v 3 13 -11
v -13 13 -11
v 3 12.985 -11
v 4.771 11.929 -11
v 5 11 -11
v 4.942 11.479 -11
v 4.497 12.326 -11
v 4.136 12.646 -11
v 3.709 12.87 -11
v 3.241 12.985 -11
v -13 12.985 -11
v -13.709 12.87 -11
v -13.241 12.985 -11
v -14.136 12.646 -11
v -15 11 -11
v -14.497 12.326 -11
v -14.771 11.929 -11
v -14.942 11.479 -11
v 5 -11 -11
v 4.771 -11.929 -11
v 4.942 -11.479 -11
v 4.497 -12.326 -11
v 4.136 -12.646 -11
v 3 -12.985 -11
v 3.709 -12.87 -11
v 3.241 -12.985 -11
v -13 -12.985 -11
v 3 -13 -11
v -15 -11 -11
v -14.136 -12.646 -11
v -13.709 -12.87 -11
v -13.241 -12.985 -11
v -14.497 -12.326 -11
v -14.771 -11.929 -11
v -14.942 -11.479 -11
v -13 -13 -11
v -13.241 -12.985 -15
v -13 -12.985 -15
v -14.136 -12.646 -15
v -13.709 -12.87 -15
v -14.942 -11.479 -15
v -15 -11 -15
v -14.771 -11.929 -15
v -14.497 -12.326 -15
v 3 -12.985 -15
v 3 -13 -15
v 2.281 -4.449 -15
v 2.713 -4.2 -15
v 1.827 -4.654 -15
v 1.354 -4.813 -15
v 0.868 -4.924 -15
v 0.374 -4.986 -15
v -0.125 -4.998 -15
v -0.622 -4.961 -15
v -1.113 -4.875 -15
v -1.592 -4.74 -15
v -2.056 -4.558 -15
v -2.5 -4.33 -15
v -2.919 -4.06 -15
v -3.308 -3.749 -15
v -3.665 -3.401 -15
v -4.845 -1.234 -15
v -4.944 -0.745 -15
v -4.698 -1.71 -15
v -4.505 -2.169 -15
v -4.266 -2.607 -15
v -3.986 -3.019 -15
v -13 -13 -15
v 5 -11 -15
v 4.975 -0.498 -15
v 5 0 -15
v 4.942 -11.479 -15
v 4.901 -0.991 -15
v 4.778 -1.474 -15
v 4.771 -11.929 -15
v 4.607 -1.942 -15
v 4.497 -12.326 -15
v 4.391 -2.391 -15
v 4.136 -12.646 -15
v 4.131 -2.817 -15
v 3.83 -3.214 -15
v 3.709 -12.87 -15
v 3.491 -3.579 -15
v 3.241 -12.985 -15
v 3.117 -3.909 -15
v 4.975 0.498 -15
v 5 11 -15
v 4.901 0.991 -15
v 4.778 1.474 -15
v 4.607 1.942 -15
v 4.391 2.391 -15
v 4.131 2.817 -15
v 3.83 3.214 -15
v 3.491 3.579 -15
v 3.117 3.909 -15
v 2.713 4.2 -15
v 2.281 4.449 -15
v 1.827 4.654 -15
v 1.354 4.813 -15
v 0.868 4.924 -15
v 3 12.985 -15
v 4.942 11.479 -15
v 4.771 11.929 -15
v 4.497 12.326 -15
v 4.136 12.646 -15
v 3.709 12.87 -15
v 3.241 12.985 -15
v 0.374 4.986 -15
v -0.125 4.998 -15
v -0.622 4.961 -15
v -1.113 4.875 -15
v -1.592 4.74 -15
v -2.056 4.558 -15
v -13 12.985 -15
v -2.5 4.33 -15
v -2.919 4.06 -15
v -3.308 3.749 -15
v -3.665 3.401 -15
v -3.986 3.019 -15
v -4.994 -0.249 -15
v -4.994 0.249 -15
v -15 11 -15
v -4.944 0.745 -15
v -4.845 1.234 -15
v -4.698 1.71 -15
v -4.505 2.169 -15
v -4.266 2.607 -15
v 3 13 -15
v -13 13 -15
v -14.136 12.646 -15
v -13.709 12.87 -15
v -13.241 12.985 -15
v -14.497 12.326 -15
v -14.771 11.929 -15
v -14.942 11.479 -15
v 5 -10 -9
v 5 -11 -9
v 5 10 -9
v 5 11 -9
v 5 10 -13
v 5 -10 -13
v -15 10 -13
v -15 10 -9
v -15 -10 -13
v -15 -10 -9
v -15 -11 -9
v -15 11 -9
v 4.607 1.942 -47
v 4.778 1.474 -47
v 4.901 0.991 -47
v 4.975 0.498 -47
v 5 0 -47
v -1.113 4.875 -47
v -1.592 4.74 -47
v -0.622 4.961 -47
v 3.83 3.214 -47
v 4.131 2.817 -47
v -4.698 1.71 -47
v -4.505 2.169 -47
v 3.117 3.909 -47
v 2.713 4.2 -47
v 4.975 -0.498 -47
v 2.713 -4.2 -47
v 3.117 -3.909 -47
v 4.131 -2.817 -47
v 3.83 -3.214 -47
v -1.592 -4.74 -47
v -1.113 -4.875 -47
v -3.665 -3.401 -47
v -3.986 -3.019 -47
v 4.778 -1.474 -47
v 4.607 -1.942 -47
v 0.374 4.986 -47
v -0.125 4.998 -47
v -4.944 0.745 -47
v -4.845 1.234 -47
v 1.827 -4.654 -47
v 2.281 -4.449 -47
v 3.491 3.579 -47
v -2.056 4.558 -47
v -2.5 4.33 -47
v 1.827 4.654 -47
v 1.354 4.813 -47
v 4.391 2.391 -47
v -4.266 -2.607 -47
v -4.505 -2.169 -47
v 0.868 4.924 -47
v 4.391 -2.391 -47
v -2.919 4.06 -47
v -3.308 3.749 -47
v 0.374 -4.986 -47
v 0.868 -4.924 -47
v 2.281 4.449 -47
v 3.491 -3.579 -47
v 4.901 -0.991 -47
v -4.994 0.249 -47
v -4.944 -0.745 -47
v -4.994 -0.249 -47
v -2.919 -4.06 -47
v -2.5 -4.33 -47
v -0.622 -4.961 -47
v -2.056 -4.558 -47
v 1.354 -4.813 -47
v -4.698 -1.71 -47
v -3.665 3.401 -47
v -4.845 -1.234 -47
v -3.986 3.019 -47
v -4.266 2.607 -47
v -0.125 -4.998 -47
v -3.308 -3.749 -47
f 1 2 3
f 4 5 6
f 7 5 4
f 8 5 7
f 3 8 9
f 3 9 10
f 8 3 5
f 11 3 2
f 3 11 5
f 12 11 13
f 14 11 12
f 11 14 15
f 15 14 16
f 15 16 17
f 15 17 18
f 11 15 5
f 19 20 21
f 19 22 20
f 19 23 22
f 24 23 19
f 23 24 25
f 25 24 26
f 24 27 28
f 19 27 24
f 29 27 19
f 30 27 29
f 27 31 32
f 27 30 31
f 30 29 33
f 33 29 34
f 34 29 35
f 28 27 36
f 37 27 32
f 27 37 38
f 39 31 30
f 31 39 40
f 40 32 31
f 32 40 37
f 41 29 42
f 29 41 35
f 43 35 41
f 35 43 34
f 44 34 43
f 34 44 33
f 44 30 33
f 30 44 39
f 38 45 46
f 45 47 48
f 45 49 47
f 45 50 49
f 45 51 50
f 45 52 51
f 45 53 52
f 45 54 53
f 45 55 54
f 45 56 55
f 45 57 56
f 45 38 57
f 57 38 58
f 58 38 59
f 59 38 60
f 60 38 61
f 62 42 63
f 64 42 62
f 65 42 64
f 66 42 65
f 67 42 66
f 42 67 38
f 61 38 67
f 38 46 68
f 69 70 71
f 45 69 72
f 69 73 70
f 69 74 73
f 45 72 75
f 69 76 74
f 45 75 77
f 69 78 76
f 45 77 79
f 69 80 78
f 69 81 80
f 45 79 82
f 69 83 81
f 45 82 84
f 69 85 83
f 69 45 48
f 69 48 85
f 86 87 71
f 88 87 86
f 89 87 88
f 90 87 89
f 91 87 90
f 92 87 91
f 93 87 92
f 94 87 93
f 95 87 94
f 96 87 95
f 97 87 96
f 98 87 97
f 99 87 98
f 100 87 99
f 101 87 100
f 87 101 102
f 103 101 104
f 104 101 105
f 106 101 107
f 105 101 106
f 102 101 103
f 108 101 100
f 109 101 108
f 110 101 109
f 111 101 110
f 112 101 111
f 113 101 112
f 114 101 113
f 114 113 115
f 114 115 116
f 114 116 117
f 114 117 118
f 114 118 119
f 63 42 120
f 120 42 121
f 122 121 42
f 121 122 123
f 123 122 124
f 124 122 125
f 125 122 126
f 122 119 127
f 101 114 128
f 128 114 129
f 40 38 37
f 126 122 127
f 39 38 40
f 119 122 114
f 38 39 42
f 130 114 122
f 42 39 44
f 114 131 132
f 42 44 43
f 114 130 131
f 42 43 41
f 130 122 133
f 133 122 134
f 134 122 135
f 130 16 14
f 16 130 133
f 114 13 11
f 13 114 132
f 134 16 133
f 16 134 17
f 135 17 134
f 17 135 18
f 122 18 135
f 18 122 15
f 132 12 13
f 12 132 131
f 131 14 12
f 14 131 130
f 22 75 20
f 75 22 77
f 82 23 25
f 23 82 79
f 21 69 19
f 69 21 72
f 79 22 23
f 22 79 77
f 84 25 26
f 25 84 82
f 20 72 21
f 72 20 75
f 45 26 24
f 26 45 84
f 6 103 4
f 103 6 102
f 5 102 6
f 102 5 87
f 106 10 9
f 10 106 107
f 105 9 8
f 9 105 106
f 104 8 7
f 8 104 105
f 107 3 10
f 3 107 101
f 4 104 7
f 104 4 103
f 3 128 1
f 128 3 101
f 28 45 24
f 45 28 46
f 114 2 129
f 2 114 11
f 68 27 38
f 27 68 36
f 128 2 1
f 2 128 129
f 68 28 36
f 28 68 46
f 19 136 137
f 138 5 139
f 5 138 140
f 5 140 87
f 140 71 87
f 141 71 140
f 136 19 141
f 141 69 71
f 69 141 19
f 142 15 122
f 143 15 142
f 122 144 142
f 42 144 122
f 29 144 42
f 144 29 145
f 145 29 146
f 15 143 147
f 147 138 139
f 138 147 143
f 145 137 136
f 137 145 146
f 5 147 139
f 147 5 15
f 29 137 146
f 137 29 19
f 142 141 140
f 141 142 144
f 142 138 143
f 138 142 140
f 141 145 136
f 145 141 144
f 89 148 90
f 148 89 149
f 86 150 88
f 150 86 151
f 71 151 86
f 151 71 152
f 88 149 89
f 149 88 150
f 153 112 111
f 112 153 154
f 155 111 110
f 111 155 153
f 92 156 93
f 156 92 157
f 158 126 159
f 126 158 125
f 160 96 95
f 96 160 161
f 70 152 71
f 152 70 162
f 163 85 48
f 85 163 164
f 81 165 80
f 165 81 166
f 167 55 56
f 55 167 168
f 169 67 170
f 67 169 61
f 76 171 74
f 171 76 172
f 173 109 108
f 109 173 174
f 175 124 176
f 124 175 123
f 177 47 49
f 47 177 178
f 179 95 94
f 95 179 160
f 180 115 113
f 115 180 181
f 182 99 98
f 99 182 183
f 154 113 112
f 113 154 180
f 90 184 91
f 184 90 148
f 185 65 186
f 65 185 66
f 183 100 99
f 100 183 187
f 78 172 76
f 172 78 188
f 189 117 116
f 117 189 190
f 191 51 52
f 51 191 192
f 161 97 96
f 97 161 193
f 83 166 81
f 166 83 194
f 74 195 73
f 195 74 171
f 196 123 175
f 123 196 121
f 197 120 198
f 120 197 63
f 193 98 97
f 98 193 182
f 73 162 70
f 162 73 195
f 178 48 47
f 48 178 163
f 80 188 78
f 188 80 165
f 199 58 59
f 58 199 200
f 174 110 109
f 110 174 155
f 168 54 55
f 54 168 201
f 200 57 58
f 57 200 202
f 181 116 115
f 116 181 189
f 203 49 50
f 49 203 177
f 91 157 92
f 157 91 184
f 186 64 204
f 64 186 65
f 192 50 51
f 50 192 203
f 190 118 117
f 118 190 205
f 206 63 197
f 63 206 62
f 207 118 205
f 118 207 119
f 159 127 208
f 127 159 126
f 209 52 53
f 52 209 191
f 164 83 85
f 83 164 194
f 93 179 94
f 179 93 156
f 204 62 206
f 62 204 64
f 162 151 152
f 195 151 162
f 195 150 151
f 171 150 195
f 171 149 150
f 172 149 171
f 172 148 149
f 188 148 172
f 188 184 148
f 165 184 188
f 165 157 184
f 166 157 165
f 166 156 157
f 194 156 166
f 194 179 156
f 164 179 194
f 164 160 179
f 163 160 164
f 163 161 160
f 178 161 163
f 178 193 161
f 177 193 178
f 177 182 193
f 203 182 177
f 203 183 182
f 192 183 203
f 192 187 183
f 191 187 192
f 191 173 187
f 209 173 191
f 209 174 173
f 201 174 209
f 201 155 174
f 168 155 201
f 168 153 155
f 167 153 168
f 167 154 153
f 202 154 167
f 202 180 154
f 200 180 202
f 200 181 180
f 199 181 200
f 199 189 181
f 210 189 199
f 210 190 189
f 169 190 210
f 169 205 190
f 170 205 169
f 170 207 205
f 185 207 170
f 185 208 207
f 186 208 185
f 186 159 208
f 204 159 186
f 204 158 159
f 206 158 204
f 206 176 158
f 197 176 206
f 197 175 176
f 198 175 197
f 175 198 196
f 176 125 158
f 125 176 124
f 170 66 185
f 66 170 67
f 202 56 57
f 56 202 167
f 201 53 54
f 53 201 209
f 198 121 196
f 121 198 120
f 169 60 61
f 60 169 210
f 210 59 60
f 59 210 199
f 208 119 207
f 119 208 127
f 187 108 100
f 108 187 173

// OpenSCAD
use <MCAD/boxes.scad>
$fs = 0.5;
$fa=1;

module outer_eye_joint_stalk() {
    difference(){
        union(){
            translate([-5,0,-13])
            roundedBox([20,26,4], radius=2, sidesonly=true);
            translate([-5,0,-11])
            cube([20,22,4], center=true);
        }
        translate([0,0,-1])
        cube([50,20,24], center=true);
    }
    translate([0,0,-47])
    cylinder(r=5,h=32);

}

outer_eye_joint_stalk();
